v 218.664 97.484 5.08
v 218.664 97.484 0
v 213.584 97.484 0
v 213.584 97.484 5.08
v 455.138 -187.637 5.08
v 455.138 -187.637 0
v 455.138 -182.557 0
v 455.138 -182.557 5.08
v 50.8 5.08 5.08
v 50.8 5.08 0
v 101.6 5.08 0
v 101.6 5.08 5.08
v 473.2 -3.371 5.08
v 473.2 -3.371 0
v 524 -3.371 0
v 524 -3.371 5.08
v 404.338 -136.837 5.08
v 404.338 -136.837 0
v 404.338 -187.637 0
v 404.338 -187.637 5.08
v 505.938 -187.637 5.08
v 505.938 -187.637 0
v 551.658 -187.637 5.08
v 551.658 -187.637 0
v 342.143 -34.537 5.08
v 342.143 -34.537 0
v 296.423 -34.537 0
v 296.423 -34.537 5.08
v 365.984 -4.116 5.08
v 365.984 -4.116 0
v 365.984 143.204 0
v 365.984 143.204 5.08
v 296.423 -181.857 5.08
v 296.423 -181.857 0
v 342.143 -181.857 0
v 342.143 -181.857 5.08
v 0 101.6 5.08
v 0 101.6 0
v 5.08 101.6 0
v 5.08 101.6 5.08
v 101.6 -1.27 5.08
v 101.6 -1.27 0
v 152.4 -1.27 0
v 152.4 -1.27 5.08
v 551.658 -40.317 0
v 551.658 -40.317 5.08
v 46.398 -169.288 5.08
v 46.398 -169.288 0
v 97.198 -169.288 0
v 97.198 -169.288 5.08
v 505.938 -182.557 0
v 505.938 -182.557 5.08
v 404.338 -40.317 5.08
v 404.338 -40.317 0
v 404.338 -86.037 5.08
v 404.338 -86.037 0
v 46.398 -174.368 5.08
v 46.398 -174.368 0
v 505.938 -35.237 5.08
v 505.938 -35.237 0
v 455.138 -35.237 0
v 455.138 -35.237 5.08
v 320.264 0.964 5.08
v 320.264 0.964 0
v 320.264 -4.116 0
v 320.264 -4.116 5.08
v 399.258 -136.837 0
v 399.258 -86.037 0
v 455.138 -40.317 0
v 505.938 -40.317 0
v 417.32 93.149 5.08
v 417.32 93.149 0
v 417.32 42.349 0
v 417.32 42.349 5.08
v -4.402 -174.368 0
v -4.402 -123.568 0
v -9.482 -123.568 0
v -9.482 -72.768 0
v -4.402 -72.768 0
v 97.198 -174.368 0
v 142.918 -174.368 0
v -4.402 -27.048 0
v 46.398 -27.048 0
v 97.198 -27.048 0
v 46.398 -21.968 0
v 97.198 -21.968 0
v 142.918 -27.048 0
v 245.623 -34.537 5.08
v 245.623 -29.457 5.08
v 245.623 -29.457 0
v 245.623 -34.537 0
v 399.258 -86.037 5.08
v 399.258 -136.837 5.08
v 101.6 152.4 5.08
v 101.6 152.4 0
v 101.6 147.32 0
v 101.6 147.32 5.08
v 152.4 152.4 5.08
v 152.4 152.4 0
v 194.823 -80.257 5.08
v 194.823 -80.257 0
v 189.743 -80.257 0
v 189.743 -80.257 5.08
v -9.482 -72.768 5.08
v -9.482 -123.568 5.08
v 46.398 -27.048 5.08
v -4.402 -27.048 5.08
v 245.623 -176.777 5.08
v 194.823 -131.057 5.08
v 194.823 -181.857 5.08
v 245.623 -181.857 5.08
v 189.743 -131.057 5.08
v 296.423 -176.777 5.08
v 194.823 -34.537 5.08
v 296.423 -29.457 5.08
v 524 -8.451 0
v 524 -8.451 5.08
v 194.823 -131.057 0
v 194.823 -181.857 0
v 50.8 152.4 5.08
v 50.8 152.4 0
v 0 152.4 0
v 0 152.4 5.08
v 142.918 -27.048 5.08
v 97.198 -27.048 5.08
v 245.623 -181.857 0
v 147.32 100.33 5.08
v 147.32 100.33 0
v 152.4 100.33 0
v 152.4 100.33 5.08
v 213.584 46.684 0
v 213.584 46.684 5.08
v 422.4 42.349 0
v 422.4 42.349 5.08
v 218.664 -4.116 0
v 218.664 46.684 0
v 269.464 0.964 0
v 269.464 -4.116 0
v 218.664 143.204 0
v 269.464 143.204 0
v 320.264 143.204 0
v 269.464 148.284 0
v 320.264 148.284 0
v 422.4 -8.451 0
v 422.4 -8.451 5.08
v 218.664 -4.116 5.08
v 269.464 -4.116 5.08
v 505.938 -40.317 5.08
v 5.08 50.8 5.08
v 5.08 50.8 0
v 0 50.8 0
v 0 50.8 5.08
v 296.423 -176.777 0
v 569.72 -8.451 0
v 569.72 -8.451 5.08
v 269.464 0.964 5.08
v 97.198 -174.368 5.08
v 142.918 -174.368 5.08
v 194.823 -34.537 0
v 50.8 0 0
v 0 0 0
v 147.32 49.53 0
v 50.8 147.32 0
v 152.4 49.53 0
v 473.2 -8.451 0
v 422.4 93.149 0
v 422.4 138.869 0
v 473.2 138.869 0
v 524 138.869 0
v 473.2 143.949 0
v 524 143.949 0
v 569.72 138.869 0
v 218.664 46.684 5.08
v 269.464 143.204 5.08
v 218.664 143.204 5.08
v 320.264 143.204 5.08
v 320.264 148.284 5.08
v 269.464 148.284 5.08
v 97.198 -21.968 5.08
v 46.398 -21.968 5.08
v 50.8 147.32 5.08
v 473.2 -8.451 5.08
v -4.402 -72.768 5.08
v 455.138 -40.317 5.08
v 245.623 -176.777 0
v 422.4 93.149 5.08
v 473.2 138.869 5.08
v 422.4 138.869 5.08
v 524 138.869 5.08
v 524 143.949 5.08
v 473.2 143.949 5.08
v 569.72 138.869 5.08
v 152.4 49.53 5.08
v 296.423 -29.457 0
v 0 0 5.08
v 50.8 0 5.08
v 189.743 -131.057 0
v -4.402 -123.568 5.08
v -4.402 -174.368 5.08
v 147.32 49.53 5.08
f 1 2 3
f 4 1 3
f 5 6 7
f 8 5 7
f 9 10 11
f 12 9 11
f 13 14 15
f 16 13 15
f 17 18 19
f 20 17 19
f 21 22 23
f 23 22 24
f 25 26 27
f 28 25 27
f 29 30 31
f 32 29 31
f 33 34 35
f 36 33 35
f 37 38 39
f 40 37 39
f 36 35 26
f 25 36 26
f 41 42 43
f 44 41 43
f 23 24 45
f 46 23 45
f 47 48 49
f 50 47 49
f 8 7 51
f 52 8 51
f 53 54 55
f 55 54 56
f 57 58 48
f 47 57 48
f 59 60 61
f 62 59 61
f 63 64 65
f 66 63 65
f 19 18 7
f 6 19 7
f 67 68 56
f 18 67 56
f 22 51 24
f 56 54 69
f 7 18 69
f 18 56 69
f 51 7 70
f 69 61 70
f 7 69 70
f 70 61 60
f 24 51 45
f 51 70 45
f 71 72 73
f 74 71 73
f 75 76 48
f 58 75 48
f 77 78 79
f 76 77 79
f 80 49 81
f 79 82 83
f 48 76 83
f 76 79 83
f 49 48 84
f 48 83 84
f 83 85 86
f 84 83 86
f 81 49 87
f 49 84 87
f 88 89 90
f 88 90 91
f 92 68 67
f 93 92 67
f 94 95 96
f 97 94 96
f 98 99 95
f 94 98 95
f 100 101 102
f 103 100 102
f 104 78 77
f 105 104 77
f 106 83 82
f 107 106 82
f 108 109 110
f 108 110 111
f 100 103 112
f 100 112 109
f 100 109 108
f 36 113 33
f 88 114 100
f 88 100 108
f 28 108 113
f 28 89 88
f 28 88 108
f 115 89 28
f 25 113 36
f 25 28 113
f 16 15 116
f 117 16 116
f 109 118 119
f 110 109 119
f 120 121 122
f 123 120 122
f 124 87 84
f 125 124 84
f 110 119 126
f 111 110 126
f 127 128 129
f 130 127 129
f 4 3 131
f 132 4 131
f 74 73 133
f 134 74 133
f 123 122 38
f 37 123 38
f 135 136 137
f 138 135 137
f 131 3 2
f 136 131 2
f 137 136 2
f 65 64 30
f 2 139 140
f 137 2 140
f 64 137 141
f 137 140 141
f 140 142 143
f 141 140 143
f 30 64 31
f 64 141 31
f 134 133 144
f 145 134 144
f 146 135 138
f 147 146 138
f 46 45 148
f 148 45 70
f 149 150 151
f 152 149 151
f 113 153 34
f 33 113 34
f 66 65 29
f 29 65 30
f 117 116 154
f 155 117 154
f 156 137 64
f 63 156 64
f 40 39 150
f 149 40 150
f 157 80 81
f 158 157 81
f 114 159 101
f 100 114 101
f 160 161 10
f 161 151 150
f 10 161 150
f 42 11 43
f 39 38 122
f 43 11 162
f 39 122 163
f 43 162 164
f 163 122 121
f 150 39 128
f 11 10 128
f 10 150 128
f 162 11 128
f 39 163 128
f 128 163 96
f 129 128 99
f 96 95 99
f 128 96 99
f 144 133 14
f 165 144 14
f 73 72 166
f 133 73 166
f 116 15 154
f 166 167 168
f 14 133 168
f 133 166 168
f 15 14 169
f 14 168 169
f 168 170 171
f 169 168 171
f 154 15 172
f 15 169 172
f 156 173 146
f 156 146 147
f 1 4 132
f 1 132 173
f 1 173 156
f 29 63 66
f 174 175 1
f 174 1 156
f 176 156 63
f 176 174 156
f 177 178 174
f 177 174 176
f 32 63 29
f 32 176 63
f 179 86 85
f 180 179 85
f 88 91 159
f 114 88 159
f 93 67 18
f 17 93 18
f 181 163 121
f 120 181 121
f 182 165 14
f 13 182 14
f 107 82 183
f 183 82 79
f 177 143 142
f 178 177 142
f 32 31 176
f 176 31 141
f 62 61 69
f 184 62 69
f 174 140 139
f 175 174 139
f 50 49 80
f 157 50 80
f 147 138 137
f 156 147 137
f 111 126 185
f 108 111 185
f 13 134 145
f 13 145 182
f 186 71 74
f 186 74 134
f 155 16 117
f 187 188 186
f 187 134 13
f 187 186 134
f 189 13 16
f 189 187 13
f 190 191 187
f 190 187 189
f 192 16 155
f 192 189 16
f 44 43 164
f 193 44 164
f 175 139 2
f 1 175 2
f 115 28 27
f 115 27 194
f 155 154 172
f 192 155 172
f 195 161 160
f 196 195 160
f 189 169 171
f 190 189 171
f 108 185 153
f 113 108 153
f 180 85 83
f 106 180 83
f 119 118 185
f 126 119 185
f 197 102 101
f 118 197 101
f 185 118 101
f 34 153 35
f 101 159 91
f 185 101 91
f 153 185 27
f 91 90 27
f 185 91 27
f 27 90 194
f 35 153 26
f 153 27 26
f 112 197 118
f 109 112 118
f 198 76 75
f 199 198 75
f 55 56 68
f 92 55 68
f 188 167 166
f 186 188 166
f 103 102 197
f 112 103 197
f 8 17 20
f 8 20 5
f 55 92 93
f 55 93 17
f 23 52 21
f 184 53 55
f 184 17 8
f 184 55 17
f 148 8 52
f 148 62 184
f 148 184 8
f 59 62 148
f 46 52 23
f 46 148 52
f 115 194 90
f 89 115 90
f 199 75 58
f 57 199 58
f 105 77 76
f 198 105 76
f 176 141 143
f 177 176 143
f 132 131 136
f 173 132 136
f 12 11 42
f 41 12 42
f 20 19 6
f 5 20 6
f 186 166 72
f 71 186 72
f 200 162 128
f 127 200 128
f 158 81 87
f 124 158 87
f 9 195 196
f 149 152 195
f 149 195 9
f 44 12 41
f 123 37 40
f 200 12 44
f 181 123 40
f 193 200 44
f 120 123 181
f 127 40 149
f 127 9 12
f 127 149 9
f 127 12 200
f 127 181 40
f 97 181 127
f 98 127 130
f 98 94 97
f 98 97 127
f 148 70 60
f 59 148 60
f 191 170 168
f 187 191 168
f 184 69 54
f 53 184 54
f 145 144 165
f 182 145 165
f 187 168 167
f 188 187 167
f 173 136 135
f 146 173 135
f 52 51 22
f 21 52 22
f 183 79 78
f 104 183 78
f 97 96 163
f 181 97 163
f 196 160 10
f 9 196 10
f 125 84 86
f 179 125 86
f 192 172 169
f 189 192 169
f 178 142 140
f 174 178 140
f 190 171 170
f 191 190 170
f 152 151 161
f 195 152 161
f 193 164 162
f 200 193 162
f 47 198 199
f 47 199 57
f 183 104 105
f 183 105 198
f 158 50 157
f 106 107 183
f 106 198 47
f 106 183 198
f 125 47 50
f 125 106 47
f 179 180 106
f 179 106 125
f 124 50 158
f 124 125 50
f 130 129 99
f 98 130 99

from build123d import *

# Parameters (mm, degrees)
F1_DEPTH = 5.08


# Not quite as in the source:
# - a feature names something its author has since deleted; it is built from what else it names


with BuildPart() as f1:
    # F0 (on Top) → F1 (new body)
    with BuildSketch(Plane.XY):
        Polygon((0, 152.4), (0, 101.6), (5.08, 101.6), (5.08, 50.8), (0, 50.8), (0, 0), (50.8, 0), (50.8, 5.08), (101.6, 5.08), (101.6, -1.27), (152.4, -1.27), (152.4, 49.53), (147.32, 49.53), (147.32, 100.33), (152.4, 100.33), (152.4, 152.4), (101.6, 152.4), (101.6, 147.32), (50.8, 147.32), (50.8, 152.4), align=None)
    extrude(amount=F1_DEPTH)


with BuildPart() as f1b:
    # F0 (on Top) → F1, piece 2 (new body)
    with BuildSketch(Plane.XY):
        Polygon((46.398417536, -27.047626133), (-4.401582464, -27.047626133), (-4.401582464, -72.767626133), (-9.481582464, -72.767626133), (-9.481582464, -123.567626133), (-4.401582464, -123.567626133), (-4.401582464, -174.367626133), (46.398417536, -174.367626133), (46.398417536, -169.287626133), (97.198417536, -169.287626133), (97.198417536, -174.367626133), (142.918417536, -174.367626133), (142.918417536, -27.047626133), (97.198417536, -27.047626133), (97.198417536, -21.967626133), (46.398417536, -21.967626133), align=None)
    extrude(amount=F1_DEPTH)


with BuildPart() as f1c:
    # F0 (on Top) → F1, piece 3 (new body)
    with BuildSketch(Plane.XY):
        Polygon((269.4640602303, 143.2038998055), (218.6640602303, 143.2038998055), (218.6640602303, 97.4838998055), (213.5840602303, 97.4838998055), (213.5840602303, 46.6838998055), (218.6640602303, 46.6838998055), (218.6640602303, -4.1161001945), (269.4640602303, -4.1161001945), (269.4640602303, 0.9638998055), (320.2640602303, 0.9638998055), (320.2640602303, -4.1161001945), (365.9840602303, -4.1161001945), (365.9840602303, 143.2038998055), (320.2640602303, 143.2038998055), (320.2640602303, 148.2838998055), (269.4640602303, 148.2838998055), align=None)
    extrude(amount=F1_DEPTH)


with BuildPart() as f1d:
    # F0 (on Top) → F1, piece 4 (new body)
    with BuildSketch(Plane.XY):
        Polygon((473.199620409, 138.8687571335), (422.399620409, 138.8687571335), (422.399620409, 93.1487571335), (417.319620409, 93.1487571335), (417.319620409, 42.3487571335), (422.399620409, 42.3487571335), (422.399620409, -8.4512428665), (473.199620409, -8.4512428665), (473.199620409, -3.3712428665), (523.999620409, -3.3712428665), (523.999620409, -8.4512428665), (569.719620409, -8.4512428665), (569.719620409, 138.8687571335), (523.999620409, 138.8687571335), (523.999620409, 143.9487571335), (473.199620409, 143.9487571335), align=None)
    extrude(amount=F1_DEPTH)


with BuildPart() as f1e:
    # F0 (on Top) → F1, piece 5 (new body)
    with BuildSketch(Plane.XY):
        Polygon((455.1379527283, -40.3170431209), (404.3379527283, -40.3170431209), (404.3379527283, -86.0370431209), (399.2579527283, -86.0370431209), (399.2579527283, -136.8370431209), (404.3379527283, -136.8370431209), (404.3379527283, -187.6370431209), (455.1379527283, -187.6370431209), (455.1379527283, -182.5570431209), (505.9379527283, -182.5570431209), (505.9379527283, -187.6370431209), (551.6579527283, -187.6370431209), (551.6579527283, -40.3170431209), (505.9379527283, -40.3170431209), (505.9379527283, -35.2370431209), (455.1379527283, -35.2370431209), align=None)
    extrude(amount=F1_DEPTH)


with BuildPart() as f1f:
    # F0 (on Top) → F1, piece 6 (new body)
    with BuildSketch(Plane.XY):
        Polygon((245.6226493549, -34.536860342), (194.8226493549, -34.536860342), (194.8226493549, -80.256860342), (189.7426493549, -80.256860342), (189.7426493549, -131.056860342), (194.8226493549, -131.056860342), (194.8226493549, -181.856860342), (245.6226493549, -181.856860342), (245.6226493549, -176.776860342), (296.4226493549, -176.776860342), (296.4226493549, -181.856860342), (342.1426493549, -181.856860342), (342.1426493549, -34.536860342), (296.4226493549, -34.536860342), (296.4226493549, -29.456860342), (245.6226493549, -29.456860342), align=None)
    extrude(amount=F1_DEPTH)


solid = Compound([f1.part, f1b.part, f1c.part, f1d.part, f1e.part, f1f.part])
